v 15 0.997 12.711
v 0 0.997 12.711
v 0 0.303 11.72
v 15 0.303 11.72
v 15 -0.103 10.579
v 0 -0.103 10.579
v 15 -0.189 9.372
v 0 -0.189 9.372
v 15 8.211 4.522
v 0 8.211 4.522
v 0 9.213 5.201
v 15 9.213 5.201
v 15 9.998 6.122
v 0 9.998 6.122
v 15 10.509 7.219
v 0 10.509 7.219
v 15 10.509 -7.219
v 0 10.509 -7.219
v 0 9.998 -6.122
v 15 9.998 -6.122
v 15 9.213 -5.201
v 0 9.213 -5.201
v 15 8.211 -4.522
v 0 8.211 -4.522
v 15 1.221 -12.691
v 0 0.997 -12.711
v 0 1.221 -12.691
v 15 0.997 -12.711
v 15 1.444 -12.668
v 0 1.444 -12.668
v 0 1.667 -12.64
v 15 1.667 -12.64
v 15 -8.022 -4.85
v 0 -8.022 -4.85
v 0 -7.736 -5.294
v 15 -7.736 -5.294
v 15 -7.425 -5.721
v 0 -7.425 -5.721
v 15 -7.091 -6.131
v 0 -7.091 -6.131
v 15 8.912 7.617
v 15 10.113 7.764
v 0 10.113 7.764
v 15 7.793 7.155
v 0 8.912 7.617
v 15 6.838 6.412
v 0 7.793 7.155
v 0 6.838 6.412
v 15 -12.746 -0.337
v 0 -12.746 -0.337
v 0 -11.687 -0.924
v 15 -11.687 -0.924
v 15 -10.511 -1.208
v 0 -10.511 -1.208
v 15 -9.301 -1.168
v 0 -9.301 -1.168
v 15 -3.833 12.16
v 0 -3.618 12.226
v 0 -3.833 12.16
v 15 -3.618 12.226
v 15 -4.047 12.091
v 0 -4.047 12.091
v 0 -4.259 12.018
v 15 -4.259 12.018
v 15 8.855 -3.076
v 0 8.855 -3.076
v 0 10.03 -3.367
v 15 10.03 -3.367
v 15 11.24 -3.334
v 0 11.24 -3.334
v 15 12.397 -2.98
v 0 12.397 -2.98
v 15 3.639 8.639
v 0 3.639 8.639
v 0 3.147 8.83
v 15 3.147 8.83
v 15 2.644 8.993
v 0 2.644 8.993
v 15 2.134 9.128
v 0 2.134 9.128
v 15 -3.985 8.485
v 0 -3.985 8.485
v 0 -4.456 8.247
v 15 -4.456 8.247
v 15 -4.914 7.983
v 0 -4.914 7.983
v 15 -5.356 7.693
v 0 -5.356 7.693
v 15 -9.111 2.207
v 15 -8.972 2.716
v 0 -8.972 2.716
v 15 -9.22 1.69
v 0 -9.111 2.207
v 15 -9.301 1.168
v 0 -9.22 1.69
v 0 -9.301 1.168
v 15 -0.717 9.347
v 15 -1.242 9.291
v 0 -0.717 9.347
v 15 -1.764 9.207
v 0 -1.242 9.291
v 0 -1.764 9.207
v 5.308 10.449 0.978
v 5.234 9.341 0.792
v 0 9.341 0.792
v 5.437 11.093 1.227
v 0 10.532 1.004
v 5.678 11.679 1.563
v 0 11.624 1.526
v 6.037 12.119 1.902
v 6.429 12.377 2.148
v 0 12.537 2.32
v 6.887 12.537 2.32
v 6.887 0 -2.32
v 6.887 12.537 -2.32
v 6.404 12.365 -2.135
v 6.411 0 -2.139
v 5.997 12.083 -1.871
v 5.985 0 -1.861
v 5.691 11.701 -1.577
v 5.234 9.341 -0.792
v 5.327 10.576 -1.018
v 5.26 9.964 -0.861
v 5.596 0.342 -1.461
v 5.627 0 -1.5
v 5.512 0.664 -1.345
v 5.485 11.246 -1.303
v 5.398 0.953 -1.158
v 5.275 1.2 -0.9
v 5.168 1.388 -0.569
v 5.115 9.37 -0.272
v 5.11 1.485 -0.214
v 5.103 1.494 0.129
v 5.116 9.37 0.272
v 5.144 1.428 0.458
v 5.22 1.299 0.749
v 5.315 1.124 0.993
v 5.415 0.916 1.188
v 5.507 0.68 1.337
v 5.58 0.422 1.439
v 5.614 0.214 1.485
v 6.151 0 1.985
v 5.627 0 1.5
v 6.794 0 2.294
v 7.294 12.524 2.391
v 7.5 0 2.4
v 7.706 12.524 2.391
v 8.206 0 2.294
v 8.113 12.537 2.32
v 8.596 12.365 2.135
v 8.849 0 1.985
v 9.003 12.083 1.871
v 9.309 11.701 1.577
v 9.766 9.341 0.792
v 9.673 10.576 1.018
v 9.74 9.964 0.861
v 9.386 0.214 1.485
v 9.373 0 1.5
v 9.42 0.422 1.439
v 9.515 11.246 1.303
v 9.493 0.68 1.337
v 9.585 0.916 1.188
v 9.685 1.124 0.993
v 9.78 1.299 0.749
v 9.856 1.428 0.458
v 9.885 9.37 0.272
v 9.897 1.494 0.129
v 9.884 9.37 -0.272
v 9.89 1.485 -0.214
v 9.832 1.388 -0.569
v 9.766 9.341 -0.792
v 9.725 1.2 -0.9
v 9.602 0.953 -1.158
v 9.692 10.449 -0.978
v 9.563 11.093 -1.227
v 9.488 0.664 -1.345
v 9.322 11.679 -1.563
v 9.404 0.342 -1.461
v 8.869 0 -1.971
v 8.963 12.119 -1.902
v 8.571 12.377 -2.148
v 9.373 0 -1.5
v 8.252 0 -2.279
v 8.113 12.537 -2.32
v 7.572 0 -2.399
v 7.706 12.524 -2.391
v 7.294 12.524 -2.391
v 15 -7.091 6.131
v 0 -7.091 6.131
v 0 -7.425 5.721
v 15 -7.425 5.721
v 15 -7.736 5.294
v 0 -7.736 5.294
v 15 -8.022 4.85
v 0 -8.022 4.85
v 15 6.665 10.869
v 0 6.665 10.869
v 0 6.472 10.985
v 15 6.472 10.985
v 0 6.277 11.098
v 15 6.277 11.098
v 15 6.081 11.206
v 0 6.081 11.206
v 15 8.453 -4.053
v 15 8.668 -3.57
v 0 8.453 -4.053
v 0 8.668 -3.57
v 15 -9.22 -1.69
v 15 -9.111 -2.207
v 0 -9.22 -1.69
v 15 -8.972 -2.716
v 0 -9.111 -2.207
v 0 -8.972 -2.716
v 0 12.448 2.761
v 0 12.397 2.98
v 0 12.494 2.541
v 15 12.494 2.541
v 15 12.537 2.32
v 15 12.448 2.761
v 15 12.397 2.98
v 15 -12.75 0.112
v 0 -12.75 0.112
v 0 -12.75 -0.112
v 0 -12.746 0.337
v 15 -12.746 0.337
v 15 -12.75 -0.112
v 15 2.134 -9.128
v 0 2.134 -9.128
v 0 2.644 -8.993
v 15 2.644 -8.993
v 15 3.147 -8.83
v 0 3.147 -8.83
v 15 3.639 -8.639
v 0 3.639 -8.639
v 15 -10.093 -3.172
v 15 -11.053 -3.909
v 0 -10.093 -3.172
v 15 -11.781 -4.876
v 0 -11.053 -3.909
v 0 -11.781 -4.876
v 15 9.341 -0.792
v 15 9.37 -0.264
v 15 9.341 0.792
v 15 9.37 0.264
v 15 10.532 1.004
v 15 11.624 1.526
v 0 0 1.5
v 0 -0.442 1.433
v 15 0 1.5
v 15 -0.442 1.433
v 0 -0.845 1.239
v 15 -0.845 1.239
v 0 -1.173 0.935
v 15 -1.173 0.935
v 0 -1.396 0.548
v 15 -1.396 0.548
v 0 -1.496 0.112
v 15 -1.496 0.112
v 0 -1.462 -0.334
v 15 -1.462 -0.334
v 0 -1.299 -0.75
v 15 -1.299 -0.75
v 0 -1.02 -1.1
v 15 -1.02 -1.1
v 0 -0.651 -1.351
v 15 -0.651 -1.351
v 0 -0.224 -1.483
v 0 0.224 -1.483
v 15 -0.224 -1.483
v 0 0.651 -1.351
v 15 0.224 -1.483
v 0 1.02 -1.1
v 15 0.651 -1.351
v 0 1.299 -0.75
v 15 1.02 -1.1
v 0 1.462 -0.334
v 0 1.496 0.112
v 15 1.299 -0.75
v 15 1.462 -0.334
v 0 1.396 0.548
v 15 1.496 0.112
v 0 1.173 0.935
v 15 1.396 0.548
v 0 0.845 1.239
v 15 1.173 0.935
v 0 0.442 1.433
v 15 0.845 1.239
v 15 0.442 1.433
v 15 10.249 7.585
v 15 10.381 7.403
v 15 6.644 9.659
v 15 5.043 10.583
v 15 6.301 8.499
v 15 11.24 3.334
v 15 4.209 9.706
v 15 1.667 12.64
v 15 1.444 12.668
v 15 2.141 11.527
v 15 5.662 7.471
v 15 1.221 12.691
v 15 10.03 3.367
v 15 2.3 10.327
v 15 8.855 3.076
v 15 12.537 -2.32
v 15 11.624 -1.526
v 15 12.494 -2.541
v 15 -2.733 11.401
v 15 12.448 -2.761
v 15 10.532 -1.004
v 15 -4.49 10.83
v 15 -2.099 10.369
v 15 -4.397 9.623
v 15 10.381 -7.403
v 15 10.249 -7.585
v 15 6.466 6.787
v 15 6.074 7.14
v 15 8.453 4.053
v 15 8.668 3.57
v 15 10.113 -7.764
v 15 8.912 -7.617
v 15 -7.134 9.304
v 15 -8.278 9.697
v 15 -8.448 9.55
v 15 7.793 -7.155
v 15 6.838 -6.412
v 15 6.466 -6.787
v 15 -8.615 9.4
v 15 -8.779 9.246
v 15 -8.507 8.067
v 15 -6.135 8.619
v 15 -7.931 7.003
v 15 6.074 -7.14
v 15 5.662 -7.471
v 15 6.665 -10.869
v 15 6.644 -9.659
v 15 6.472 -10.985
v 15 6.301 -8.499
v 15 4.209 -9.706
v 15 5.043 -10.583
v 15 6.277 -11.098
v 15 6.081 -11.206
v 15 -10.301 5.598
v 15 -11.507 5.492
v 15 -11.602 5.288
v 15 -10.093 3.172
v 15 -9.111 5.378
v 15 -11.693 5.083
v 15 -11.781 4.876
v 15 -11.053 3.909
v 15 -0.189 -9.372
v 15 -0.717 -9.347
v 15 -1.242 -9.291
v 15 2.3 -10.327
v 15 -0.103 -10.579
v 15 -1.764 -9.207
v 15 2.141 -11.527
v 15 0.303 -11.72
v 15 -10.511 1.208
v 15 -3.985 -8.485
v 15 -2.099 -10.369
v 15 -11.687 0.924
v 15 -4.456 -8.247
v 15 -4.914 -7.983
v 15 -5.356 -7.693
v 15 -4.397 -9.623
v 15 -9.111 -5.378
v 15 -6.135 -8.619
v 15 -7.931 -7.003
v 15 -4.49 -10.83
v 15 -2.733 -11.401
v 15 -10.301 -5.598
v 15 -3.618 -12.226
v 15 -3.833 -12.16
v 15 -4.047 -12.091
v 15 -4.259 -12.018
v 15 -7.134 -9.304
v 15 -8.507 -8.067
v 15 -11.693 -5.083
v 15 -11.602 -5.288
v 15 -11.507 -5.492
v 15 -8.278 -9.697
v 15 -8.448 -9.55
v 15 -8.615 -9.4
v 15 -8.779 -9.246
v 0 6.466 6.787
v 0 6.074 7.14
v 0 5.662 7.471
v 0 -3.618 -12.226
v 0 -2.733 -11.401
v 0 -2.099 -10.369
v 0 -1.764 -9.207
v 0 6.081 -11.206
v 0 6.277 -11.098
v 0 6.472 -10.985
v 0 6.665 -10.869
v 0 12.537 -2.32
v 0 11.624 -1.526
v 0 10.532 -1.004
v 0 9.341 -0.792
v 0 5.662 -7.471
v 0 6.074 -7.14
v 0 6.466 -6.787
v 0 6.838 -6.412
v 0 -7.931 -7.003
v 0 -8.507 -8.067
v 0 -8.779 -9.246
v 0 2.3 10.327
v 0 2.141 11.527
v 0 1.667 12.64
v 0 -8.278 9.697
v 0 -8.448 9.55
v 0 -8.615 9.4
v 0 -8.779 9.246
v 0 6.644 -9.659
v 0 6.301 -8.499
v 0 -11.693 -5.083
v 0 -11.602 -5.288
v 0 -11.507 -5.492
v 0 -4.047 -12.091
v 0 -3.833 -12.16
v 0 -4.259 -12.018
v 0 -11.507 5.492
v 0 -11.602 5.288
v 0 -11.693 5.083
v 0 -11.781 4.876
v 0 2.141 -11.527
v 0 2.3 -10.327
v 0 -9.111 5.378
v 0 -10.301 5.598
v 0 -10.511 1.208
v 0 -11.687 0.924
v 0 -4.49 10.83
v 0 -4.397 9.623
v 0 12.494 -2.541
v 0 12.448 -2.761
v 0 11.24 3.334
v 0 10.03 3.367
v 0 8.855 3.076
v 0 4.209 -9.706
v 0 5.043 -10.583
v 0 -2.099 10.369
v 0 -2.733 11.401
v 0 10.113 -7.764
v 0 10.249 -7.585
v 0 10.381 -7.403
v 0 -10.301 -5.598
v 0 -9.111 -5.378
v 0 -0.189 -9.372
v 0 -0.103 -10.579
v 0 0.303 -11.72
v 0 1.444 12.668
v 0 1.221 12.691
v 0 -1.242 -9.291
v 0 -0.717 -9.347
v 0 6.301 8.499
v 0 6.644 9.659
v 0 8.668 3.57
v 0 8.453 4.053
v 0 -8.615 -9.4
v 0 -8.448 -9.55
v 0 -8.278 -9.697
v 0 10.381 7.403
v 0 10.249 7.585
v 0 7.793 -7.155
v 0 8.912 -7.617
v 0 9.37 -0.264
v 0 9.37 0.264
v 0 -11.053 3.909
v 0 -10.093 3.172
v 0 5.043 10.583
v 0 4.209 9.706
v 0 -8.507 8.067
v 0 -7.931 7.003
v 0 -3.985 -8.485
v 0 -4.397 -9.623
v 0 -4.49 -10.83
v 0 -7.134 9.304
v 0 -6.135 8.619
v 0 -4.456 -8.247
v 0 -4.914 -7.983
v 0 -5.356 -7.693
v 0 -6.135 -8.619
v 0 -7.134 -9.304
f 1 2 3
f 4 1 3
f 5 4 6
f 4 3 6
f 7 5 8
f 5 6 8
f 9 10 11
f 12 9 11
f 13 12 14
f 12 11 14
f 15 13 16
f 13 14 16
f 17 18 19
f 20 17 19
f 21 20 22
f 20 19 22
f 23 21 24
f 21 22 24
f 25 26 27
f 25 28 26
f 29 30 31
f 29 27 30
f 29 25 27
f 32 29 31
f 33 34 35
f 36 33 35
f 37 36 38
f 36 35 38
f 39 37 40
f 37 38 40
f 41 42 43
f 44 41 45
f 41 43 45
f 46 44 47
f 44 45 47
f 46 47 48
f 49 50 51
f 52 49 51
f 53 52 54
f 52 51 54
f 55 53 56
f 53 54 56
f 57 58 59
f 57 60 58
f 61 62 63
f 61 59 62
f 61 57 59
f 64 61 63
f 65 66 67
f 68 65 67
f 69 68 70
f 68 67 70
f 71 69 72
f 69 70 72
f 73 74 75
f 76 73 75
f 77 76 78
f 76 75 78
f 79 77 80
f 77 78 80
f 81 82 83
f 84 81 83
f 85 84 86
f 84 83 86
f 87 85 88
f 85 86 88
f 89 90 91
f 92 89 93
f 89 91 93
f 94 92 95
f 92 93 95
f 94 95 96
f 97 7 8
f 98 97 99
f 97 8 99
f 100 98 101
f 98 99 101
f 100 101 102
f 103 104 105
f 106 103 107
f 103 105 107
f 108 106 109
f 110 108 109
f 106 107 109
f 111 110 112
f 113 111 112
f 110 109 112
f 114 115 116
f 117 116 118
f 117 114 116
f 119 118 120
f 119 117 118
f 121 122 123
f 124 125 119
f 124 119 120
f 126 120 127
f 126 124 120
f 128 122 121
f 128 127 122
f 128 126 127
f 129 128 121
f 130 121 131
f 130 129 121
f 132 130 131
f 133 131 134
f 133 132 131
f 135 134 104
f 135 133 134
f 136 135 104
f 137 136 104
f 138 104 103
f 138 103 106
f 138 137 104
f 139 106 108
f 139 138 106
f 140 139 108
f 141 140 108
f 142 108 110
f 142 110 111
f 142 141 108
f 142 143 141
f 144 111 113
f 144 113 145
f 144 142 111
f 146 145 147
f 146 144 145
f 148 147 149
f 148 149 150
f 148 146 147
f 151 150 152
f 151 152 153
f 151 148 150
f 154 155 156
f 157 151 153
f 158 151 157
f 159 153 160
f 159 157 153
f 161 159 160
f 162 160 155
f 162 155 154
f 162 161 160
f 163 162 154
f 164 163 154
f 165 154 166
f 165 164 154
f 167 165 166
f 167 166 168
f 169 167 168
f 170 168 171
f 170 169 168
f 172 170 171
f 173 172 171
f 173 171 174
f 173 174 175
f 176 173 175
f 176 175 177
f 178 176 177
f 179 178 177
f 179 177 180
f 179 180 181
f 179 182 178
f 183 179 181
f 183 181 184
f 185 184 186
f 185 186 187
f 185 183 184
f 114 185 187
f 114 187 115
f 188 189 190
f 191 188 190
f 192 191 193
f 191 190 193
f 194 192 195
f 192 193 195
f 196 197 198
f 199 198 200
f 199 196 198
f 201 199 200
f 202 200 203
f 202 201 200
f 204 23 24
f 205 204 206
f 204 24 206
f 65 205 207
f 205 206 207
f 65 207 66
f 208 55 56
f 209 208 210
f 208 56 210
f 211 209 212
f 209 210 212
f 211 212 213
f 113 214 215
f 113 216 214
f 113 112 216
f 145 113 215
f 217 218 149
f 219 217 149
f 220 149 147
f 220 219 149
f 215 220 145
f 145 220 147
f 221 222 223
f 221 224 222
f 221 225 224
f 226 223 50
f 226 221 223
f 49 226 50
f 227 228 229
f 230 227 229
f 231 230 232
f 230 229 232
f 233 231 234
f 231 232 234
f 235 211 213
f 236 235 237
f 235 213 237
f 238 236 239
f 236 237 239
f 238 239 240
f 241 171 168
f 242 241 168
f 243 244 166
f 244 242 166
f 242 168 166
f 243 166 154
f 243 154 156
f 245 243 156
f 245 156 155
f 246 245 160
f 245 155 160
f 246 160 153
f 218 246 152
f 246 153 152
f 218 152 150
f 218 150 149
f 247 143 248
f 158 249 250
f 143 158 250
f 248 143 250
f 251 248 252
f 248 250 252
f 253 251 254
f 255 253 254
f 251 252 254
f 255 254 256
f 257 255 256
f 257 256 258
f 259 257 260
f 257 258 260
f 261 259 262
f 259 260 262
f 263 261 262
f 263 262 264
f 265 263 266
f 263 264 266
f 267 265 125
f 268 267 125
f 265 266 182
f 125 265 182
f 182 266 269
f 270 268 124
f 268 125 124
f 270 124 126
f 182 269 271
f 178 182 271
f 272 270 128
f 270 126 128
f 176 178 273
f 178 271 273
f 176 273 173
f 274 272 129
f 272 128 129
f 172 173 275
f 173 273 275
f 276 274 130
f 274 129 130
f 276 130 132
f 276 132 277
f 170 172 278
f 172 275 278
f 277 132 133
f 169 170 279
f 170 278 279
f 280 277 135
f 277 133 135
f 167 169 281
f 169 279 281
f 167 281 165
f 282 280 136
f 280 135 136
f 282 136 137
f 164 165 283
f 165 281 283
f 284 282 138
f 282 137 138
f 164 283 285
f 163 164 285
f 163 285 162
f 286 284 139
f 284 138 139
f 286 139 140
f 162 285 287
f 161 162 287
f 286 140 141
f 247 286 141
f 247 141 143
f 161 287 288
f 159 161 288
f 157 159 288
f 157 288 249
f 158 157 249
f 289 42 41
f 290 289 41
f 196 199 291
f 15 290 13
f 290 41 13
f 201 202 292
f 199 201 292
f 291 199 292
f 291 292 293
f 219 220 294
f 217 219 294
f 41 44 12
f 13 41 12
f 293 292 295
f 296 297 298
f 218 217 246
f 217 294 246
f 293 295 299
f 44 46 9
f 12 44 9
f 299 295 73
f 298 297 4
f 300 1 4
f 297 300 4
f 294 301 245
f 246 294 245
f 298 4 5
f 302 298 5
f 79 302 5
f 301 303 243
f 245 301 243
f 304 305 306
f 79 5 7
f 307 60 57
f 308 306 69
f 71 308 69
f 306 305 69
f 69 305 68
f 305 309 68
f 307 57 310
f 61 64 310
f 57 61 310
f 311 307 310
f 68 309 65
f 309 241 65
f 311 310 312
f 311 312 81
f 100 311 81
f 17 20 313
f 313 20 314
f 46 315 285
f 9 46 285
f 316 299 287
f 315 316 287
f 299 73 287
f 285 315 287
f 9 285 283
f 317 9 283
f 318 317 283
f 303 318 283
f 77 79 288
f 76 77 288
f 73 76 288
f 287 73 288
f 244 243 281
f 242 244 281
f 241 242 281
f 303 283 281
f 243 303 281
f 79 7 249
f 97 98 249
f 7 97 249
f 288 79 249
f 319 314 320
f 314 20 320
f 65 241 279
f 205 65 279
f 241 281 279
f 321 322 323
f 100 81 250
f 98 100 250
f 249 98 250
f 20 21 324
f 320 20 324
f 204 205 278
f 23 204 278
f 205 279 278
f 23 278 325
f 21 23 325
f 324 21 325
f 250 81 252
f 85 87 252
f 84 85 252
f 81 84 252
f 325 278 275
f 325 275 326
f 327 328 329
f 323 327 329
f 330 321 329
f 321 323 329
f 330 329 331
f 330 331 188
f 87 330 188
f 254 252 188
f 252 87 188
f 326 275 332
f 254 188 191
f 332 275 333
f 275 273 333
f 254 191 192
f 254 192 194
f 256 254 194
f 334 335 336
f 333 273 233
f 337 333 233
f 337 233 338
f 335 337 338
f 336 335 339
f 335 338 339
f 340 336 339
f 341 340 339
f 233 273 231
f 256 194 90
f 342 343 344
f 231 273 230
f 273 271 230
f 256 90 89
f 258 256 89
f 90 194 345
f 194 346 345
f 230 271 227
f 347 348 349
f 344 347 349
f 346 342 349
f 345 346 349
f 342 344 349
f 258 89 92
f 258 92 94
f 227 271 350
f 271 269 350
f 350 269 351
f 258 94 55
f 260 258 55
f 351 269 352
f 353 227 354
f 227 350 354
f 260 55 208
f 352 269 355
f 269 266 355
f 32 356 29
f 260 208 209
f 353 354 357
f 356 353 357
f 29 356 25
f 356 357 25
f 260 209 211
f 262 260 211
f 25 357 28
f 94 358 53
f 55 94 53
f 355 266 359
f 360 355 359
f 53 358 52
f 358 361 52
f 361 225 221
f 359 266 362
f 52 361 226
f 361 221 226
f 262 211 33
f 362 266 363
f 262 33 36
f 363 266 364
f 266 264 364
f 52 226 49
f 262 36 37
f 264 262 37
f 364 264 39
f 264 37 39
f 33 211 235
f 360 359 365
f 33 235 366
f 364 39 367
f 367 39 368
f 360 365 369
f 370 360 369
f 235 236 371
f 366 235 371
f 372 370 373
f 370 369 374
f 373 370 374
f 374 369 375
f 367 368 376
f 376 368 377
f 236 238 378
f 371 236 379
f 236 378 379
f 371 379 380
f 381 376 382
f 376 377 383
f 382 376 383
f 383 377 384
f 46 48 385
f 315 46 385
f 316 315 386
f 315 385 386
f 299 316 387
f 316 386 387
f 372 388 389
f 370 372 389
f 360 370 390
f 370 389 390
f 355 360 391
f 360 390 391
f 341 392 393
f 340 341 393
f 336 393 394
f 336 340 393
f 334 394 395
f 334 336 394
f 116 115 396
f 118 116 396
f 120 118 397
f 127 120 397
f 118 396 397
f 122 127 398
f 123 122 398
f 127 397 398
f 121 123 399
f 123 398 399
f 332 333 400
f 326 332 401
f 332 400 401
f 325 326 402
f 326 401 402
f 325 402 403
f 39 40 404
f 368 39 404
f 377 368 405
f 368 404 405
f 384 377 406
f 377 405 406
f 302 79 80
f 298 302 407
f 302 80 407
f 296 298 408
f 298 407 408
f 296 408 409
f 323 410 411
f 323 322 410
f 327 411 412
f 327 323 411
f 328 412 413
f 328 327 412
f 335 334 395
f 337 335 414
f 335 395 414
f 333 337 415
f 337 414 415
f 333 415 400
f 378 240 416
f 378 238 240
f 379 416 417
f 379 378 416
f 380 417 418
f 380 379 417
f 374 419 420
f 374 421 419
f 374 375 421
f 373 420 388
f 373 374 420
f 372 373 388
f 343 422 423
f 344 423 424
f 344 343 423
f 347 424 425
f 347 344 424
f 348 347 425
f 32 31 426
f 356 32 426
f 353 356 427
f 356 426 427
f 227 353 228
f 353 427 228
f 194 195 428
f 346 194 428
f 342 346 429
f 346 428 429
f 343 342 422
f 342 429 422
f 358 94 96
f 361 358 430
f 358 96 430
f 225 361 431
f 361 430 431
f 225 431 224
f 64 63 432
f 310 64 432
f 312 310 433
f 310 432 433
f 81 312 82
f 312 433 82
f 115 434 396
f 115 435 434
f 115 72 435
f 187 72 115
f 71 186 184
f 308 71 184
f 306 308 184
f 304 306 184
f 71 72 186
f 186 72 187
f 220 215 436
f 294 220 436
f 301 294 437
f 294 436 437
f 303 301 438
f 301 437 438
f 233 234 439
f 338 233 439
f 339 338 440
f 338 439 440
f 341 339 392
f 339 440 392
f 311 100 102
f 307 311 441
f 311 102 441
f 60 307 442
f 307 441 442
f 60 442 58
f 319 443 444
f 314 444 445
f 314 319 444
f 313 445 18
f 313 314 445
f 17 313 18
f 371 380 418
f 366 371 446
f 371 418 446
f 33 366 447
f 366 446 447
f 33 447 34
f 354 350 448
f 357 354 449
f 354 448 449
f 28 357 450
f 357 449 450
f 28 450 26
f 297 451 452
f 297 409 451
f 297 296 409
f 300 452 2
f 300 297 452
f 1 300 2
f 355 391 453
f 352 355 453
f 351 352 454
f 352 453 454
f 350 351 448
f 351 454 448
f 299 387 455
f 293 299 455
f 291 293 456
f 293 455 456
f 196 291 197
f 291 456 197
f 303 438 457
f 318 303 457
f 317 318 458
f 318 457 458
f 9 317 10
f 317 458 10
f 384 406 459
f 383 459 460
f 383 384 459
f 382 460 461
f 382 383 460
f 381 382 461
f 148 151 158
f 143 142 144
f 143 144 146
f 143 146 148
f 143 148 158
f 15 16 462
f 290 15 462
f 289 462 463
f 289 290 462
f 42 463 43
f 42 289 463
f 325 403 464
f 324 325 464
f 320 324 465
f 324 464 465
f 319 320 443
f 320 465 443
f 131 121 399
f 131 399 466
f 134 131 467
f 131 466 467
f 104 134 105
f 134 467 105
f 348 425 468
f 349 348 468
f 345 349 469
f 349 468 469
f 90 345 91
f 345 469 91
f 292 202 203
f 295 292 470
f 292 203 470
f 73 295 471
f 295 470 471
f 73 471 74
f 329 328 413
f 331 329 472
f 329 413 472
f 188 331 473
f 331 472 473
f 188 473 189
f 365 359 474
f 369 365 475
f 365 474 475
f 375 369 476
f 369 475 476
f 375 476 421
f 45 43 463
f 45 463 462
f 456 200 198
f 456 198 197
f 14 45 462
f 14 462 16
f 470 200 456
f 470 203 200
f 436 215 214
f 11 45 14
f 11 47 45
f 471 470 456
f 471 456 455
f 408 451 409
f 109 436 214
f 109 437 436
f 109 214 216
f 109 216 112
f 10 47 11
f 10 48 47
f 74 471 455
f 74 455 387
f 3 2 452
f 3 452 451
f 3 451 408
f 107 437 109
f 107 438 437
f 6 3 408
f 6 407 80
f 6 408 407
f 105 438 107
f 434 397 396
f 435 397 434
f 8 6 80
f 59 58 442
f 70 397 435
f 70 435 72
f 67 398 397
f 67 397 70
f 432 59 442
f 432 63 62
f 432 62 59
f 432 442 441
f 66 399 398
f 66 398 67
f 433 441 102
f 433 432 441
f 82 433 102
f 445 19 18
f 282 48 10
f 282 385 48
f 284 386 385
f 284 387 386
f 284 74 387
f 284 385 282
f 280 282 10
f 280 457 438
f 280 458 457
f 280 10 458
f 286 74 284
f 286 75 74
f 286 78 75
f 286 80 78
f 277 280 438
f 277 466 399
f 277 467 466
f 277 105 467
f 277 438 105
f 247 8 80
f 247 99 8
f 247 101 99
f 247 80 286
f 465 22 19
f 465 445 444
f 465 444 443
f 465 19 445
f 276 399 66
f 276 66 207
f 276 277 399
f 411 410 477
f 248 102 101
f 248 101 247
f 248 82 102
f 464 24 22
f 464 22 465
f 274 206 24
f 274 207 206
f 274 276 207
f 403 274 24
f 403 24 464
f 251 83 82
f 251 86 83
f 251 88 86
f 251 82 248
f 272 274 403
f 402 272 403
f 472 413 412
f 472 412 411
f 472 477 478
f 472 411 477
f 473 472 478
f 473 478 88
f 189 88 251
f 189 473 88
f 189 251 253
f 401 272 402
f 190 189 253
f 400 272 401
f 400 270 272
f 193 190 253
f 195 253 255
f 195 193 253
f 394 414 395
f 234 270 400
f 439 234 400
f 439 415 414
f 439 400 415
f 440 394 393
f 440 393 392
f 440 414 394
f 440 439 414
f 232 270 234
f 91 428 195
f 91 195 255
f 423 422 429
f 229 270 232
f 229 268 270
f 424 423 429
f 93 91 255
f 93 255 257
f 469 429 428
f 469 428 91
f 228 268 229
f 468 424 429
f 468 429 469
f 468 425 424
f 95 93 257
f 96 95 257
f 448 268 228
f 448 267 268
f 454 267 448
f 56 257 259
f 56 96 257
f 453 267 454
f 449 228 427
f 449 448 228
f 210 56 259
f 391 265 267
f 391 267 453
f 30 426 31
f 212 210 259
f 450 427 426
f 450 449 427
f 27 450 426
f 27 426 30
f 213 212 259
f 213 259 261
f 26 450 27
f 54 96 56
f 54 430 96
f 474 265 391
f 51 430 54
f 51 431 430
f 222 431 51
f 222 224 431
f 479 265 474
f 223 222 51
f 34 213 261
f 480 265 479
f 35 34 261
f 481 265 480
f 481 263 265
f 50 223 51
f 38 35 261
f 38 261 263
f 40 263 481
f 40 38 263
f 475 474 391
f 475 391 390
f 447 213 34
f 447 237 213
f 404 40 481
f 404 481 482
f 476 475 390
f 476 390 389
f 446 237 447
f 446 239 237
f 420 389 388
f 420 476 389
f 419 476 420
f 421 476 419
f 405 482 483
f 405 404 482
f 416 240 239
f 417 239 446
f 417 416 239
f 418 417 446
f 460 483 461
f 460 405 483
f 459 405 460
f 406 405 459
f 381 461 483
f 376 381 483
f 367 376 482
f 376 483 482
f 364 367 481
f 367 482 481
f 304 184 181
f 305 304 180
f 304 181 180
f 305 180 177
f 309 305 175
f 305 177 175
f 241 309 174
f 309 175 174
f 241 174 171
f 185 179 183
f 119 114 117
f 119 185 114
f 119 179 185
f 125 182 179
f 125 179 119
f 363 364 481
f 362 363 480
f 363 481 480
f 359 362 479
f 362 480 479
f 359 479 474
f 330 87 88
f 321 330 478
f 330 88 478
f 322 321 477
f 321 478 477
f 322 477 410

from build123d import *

# Parameters (mm, degrees)
BASPROSKE_W        = 15
BASPROSKE_H        = 12.75
TOOTHCUT_DEPTH     = 24.454743657
TEETHCUTS_COUNT    = 15
TEETHCUTS_ANGLE    = 336
BORSKE_R           = 1.5
BORE_DEPTH         = 50.0000508
SKETCH1_R          = 2.4
CUT_EXTRUDE1_DEPTH = 18


with BuildPart() as part:
    # BasProSke → Base-Revolve (revolve)
    with BuildSketch(Plane(origin=(0, 0, 0), x_dir=(1, 0, 0), z_dir=(0, 1, 0)), mode=Mode.PRIVATE) as base_revolve_sk:
        with Locations((7.5, 6.375)):
            Rectangle(BASPROSKE_W, BASPROSKE_H)
    revolve(base_revolve_sk.sketch.rotate(Axis((-10, 0, 0), (1, 0, 0)), 180), axis=Axis((-10, 0, 0), (1, 0, 0)))

    # TooCutSke → ToothCut (cut, through all)
    with BuildSketch(Plane(origin=(0, 0, 0), x_dir=(0, 0, -1), z_dir=(1, 0, 0))):
        with BuildLine():
            ThreePointArc((0.791546546, 9.340520867), (0, 9.374), (-0.791546546, 9.340520867))
            ThreePointArc((-0.791546546, 9.340520867), (-1.235070734, 11.110218102), (-2.344732916, 12.558386549))
            ThreePointArc((-2.344732916, 12.558386549), (0, 12.7754), (2.344732916, 12.558386549))
            ThreePointArc((2.344732916, 12.558386549), (1.235070734, 11.110218102), (0.791546546, 9.340520867))
        make_face()
    toothcut = extrude(amount=TOOTHCUT_DEPTH, mode=Mode.SUBTRACT)

    # TeethCuts: ToothCut ×15 about axis
    teethcuts_axis = Axis((-10, 0, 0), (1, 0, 0))
    for i in range(1, TEETHCUTS_COUNT):
        add(toothcut.rotate(teethcuts_axis, i * TEETHCUTS_ANGLE / (TEETHCUTS_COUNT - 1)), mode=Mode.SUBTRACT)

    # BorSke → Bore (cut, symmetric)
    with BuildSketch(Plane(origin=(0, 0, 0), x_dir=(0, 0, -1), z_dir=(1, 0, 0))):
        with Locations(Location((0, 0, 0), (0, 0, 180))):
            Circle(BORSKE_R)
    extrude(amount=BORE_DEPTH, both=True, mode=Mode.SUBTRACT)

    # Sketch1 → Cut-Extrude1 (cut)
    with BuildSketch(Plane(origin=(0, 0, 0), x_dir=(1, 0, 0), z_dir=(0, 1, 0))):
        with Locations(Location((7.5, 0, 0), (0, 0, 104.808618926))):
            Circle(SKETCH1_R)
    extrude(amount=CUT_EXTRUDE1_DEPTH, mode=Mode.SUBTRACT)


solid = part.part
